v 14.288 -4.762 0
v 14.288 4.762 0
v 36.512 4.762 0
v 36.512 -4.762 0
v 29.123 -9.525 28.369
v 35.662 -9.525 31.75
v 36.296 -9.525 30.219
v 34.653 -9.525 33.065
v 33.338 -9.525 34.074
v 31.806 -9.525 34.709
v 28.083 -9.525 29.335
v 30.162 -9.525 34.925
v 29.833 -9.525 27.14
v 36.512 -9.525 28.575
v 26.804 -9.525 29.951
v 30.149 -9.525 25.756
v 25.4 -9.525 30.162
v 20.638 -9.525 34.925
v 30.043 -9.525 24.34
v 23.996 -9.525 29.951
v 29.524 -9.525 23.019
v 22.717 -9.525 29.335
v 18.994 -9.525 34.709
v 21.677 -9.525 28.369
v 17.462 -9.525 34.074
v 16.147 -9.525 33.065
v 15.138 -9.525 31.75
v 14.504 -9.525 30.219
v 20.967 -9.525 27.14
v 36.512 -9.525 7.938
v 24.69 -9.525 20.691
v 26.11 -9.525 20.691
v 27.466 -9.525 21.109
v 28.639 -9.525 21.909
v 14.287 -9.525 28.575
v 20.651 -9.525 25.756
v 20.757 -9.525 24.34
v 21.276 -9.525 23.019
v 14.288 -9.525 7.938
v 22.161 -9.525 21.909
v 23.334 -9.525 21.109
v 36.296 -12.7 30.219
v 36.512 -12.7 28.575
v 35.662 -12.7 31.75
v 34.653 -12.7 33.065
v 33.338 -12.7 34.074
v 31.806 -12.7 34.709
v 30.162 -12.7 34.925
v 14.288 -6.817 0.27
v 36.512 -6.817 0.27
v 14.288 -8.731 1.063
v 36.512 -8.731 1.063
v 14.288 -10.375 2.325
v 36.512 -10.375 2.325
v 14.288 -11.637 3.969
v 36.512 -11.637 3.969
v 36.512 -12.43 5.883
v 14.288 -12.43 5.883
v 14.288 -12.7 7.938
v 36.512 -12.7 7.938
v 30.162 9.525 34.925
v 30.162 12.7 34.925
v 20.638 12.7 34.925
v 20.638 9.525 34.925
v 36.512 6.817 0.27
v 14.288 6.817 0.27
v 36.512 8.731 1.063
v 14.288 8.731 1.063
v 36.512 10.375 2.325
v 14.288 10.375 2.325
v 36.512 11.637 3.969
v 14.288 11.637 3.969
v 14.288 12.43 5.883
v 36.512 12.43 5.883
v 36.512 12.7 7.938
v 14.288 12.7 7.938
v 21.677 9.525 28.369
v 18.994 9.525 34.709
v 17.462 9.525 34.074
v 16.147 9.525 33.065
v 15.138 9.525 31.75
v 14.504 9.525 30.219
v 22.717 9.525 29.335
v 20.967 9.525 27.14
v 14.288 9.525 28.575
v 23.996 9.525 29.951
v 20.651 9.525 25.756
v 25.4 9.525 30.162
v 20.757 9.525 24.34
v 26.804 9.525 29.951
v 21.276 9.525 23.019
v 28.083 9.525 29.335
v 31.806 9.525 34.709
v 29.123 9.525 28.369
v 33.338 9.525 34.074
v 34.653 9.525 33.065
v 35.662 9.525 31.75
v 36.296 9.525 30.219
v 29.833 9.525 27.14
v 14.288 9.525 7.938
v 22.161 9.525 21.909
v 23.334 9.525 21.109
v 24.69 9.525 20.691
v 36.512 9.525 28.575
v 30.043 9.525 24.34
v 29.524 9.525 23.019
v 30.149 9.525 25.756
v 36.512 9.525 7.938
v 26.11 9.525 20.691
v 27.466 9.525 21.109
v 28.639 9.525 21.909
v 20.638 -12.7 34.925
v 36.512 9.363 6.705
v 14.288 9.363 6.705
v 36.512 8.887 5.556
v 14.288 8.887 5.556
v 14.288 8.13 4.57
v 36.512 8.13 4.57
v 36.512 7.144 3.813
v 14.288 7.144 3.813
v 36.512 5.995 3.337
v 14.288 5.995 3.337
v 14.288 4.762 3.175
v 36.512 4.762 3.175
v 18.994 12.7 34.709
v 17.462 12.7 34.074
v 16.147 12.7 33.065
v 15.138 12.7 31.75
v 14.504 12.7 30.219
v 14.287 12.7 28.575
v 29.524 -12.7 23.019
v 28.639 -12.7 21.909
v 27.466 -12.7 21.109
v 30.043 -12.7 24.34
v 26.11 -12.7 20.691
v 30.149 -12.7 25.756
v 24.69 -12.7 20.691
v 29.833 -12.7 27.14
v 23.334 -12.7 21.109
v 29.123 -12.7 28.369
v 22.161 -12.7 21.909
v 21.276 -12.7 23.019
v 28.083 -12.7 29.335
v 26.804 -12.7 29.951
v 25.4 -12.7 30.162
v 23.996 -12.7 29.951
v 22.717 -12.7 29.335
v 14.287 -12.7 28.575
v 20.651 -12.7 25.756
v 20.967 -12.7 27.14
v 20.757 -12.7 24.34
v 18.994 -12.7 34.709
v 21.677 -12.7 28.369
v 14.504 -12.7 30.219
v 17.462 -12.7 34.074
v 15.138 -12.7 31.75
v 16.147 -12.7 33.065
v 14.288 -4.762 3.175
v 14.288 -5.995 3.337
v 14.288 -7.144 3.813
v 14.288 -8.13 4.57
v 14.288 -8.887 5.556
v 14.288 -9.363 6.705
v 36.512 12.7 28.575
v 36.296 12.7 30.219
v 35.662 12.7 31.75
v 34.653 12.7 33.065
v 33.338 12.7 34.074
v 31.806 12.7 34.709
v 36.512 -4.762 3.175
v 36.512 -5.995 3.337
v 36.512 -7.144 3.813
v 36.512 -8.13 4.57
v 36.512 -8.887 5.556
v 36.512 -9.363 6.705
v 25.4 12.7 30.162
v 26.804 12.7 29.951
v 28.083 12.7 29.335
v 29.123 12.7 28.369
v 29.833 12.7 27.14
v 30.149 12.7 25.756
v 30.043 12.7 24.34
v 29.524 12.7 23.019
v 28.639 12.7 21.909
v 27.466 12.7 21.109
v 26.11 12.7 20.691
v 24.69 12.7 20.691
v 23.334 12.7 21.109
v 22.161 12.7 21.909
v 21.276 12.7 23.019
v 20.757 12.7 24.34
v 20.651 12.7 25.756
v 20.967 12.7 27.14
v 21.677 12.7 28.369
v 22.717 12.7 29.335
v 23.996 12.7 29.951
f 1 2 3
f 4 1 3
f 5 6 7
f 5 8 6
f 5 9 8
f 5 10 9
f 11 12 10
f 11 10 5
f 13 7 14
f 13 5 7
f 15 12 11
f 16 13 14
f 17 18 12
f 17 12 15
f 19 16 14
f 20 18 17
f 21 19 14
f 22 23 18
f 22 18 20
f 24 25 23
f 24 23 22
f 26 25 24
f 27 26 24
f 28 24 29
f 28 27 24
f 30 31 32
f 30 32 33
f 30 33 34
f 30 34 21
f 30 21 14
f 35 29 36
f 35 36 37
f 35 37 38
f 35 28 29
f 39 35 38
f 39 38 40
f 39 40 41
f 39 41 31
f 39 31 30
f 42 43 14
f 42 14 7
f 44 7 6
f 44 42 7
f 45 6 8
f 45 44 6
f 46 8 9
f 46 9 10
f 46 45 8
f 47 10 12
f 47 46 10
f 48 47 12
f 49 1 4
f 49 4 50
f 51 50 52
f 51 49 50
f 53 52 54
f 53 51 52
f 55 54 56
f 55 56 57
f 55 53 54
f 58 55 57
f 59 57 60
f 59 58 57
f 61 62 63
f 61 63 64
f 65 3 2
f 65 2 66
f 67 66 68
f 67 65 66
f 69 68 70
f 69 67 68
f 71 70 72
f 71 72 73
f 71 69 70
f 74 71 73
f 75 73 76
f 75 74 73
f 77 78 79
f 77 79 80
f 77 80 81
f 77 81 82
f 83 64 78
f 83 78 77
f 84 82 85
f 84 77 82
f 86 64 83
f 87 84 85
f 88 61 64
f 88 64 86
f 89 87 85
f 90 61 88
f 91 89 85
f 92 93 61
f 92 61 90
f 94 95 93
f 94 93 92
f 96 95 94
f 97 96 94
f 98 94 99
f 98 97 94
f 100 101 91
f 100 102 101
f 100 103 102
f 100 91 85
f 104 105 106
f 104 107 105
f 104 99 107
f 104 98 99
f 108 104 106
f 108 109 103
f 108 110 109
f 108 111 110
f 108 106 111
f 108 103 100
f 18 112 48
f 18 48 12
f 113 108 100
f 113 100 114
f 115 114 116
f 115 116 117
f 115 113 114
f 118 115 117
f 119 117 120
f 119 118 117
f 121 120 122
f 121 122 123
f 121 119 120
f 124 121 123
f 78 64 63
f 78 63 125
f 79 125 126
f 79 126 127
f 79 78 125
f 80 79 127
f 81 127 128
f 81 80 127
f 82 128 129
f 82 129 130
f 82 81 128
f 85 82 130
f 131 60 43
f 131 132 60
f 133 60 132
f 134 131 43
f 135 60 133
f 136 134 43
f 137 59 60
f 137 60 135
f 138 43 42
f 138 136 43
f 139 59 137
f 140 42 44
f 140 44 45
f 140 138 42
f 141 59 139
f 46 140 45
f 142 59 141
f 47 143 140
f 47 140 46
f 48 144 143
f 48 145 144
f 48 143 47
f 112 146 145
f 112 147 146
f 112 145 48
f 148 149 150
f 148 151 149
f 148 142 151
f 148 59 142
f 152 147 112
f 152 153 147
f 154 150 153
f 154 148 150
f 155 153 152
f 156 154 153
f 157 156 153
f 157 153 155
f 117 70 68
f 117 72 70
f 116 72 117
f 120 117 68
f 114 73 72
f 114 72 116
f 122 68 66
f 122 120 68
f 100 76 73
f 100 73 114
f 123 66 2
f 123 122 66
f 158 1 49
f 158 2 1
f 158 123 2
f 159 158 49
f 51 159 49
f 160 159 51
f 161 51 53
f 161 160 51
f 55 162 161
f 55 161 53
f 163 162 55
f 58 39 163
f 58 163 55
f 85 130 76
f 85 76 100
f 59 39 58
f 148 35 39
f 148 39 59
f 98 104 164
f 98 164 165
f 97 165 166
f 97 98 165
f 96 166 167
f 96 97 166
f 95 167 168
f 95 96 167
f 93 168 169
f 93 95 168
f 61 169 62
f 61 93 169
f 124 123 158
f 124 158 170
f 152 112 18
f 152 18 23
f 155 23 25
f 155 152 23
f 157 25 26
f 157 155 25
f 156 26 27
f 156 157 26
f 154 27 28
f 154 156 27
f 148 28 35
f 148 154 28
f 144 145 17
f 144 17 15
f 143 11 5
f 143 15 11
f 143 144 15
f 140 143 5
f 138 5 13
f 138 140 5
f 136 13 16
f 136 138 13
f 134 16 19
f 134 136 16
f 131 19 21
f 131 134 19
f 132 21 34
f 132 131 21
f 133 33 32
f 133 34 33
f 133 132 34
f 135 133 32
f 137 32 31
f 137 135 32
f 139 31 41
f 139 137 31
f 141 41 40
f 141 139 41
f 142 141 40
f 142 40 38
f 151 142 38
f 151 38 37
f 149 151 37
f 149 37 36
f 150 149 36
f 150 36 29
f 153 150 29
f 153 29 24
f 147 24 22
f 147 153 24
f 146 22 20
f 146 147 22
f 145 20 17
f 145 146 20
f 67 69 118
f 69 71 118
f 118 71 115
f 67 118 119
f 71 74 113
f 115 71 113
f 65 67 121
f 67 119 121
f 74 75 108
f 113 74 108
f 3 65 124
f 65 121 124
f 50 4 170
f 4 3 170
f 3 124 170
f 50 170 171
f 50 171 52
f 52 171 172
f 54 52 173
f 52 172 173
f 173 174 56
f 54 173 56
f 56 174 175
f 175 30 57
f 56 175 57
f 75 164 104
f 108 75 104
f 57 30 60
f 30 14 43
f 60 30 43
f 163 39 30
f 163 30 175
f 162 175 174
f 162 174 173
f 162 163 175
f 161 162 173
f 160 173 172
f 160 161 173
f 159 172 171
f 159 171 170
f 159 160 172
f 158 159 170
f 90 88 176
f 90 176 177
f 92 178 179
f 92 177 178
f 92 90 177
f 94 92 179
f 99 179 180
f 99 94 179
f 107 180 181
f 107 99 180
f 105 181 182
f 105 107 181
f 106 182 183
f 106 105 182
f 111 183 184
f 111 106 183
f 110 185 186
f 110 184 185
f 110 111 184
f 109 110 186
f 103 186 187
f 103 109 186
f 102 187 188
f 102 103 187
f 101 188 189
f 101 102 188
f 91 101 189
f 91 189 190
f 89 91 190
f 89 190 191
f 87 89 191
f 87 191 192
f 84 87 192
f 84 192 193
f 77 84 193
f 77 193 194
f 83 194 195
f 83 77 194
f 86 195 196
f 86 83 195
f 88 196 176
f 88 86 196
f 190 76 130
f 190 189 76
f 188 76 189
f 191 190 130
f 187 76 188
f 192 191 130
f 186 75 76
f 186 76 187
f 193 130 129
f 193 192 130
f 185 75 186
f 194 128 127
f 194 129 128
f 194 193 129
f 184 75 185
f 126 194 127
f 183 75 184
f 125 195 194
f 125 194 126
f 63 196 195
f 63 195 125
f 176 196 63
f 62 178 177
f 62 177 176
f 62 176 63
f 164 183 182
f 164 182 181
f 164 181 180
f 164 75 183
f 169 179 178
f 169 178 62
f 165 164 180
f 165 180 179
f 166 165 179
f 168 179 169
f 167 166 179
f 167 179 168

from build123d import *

# Parameters (mm, degrees)
SKETCH12_W                     = 22.225
SKETCH12_H                     = 25.4
BASE_FLANGE2_DEPTH             = 3.175
EDGE_FLANGE2_STRIP_W           = 22.225
EDGE_FLANGE2_STRIP_H           = 3.175
EDGE_FLANGE2_STRIP_CUT_DEPTH   = 22.225
EDGE_FLANGE2_STRIP_2_W         = 22.225
EDGE_FLANGE2_STRIP_2_H         = 3.175
EDGE_FLANGE2_STRIP_CUT_2_DEPTH = 22.225
EDGE_FLANGE2_DEPTH             = 22.225
EDGE_FLANGE2_BEND_DEPTH        = 22.225
CUT_EXTRUDE1_DEPTH             = 53.098064084
CUT_EXTRUDE1_DEPTH_BACK        = 53.098064084
SKETCH23_R                     = 4.7625
BREAK_CORNER1_START            = -12.7
BREAK_CORNER1_DEPTH            = 25.4


# Read off the part's stored shape, not the designer's step: Break-Corner1
# Sheet-metal steps are written as plain solids
with BuildPart() as part:
    # Sketch12 → Base-Flange2 (new body)
    with BuildSketch(Plane.XY):
        with Locations((25.4, 0)):
            Rectangle(SKETCH12_W, SKETCH12_H)
    extrude(amount=BASE_FLANGE2_DEPTH)

    # Edge-Flange2 strip (across the edge) → Edge-Flange2 strip cut (cut)
    with BuildSketch(Plane(origin=(36.5125, 12.7, 3.175), x_dir=(0, -1, 0), z_dir=(-1, 0, 0))):
        with Locations((-3.175, -1.5875)):
            Rectangle(EDGE_FLANGE2_STRIP_W, EDGE_FLANGE2_STRIP_H)
    extrude(amount=EDGE_FLANGE2_STRIP_CUT_DEPTH, mode=Mode.SUBTRACT)

    # Edge-Flange2 strip 2 (across the edge) → Edge-Flange2 strip cut 2 (cut)
    with BuildSketch(Plane(origin=(14.2875, -12.7, 3.175), x_dir=(0, 1, 0), z_dir=(1, 0, 0))):
        with Locations((-3.175, -1.5875)):
            Rectangle(EDGE_FLANGE2_STRIP_2_W, EDGE_FLANGE2_STRIP_2_H)
    extrude(amount=EDGE_FLANGE2_STRIP_CUT_2_DEPTH, mode=Mode.SUBTRACT)

    # Edge-Flange2 section (across the edge) → Edge-Flange2 (add)
    with BuildSketch(Plane(origin=(36.5125, 12.7, 3.175), x_dir=(0, -1, 0), z_dir=(-1, 0, 0))):
        with BuildLine():
            Line((0, 4.7625), (0, 31.75))
            Line((0, 31.75), (3.175, 31.75))
            Line((3.175, 31.75), (3.175, 4.7625))
            ThreePointArc((3.175, 4.7625), (4.569903955, 1.394903955), (7.9375, 0))
            Line((7.9375, 0), (7.9375, -3.175))
            ThreePointArc((7.9375, -3.175), (2.324839924, -0.850160076), (0, 4.7625))
        make_face()
    extrude(amount=EDGE_FLANGE2_DEPTH)

    # Edge-Flange2 section 2 (across the edge) → Edge-Flange2 bend (add)
    with BuildSketch(Plane(origin=(14.2875, -12.7, 3.175), x_dir=(0, 1, 0), z_dir=(1, 0, 0))):
        with BuildLine():
            Line((0, 4.7625), (0, 31.75))
            Line((0, 31.75), (3.175, 31.75))
            Line((3.175, 31.75), (3.175, 4.7625))
            ThreePointArc((3.175, 4.7625), (4.569903955, 1.394903955), (7.9375, 0))
            Line((7.9375, 0), (7.9375, -3.175))
            ThreePointArc((7.9375, -3.175), (2.324839924, -0.850160076), (0, 4.7625))
        make_face()
    extrude(amount=EDGE_FLANGE2_BEND_DEPTH)

    # Sketch23 → Cut-Extrude1 (cut, two sides: drawn at the far end of the back side and taken through both)
    with BuildSketch(Plane(origin=(0, 0, 0), x_dir=(1, 0, 0), z_dir=(0, 1, 0)).offset(-CUT_EXTRUDE1_DEPTH_BACK)):
        with Locations(Location((25.4, -25.4, 0), (0, 0, 270))):
            Circle(SKETCH23_R)
    extrude(amount=CUT_EXTRUDE1_DEPTH + CUT_EXTRUDE1_DEPTH_BACK, mode=Mode.SUBTRACT)

    # Break-Corner1 outline → Break-Corner1 (cut)
    with BuildSketch(Plane(origin=(0, 0, 0), x_dir=(1, 0, 0), z_dir=(0, 1, 0)).offset(BREAK_CORNER1_START)):
        with BuildLine():
            Line((36.5125, -34.925), (36.5125, -28.575))
            ThreePointArc((36.5125, -28.575), (34.652628061, -33.065128061), (30.1625, -34.925))
            Line((30.1625, -34.925), (36.5125, -34.925))
        make_face()
        with BuildLine():
            Line((14.2875, -34.925), (20.6375, -34.925))
            ThreePointArc((20.6375, -34.925), (16.147371939, -33.065128061), (14.2875, -28.575))
            Line((14.2875, -28.575), (14.2875, -34.925))
        make_face()
    extrude(amount=BREAK_CORNER1_DEPTH, mode=Mode.SUBTRACT)


solid = part.part
